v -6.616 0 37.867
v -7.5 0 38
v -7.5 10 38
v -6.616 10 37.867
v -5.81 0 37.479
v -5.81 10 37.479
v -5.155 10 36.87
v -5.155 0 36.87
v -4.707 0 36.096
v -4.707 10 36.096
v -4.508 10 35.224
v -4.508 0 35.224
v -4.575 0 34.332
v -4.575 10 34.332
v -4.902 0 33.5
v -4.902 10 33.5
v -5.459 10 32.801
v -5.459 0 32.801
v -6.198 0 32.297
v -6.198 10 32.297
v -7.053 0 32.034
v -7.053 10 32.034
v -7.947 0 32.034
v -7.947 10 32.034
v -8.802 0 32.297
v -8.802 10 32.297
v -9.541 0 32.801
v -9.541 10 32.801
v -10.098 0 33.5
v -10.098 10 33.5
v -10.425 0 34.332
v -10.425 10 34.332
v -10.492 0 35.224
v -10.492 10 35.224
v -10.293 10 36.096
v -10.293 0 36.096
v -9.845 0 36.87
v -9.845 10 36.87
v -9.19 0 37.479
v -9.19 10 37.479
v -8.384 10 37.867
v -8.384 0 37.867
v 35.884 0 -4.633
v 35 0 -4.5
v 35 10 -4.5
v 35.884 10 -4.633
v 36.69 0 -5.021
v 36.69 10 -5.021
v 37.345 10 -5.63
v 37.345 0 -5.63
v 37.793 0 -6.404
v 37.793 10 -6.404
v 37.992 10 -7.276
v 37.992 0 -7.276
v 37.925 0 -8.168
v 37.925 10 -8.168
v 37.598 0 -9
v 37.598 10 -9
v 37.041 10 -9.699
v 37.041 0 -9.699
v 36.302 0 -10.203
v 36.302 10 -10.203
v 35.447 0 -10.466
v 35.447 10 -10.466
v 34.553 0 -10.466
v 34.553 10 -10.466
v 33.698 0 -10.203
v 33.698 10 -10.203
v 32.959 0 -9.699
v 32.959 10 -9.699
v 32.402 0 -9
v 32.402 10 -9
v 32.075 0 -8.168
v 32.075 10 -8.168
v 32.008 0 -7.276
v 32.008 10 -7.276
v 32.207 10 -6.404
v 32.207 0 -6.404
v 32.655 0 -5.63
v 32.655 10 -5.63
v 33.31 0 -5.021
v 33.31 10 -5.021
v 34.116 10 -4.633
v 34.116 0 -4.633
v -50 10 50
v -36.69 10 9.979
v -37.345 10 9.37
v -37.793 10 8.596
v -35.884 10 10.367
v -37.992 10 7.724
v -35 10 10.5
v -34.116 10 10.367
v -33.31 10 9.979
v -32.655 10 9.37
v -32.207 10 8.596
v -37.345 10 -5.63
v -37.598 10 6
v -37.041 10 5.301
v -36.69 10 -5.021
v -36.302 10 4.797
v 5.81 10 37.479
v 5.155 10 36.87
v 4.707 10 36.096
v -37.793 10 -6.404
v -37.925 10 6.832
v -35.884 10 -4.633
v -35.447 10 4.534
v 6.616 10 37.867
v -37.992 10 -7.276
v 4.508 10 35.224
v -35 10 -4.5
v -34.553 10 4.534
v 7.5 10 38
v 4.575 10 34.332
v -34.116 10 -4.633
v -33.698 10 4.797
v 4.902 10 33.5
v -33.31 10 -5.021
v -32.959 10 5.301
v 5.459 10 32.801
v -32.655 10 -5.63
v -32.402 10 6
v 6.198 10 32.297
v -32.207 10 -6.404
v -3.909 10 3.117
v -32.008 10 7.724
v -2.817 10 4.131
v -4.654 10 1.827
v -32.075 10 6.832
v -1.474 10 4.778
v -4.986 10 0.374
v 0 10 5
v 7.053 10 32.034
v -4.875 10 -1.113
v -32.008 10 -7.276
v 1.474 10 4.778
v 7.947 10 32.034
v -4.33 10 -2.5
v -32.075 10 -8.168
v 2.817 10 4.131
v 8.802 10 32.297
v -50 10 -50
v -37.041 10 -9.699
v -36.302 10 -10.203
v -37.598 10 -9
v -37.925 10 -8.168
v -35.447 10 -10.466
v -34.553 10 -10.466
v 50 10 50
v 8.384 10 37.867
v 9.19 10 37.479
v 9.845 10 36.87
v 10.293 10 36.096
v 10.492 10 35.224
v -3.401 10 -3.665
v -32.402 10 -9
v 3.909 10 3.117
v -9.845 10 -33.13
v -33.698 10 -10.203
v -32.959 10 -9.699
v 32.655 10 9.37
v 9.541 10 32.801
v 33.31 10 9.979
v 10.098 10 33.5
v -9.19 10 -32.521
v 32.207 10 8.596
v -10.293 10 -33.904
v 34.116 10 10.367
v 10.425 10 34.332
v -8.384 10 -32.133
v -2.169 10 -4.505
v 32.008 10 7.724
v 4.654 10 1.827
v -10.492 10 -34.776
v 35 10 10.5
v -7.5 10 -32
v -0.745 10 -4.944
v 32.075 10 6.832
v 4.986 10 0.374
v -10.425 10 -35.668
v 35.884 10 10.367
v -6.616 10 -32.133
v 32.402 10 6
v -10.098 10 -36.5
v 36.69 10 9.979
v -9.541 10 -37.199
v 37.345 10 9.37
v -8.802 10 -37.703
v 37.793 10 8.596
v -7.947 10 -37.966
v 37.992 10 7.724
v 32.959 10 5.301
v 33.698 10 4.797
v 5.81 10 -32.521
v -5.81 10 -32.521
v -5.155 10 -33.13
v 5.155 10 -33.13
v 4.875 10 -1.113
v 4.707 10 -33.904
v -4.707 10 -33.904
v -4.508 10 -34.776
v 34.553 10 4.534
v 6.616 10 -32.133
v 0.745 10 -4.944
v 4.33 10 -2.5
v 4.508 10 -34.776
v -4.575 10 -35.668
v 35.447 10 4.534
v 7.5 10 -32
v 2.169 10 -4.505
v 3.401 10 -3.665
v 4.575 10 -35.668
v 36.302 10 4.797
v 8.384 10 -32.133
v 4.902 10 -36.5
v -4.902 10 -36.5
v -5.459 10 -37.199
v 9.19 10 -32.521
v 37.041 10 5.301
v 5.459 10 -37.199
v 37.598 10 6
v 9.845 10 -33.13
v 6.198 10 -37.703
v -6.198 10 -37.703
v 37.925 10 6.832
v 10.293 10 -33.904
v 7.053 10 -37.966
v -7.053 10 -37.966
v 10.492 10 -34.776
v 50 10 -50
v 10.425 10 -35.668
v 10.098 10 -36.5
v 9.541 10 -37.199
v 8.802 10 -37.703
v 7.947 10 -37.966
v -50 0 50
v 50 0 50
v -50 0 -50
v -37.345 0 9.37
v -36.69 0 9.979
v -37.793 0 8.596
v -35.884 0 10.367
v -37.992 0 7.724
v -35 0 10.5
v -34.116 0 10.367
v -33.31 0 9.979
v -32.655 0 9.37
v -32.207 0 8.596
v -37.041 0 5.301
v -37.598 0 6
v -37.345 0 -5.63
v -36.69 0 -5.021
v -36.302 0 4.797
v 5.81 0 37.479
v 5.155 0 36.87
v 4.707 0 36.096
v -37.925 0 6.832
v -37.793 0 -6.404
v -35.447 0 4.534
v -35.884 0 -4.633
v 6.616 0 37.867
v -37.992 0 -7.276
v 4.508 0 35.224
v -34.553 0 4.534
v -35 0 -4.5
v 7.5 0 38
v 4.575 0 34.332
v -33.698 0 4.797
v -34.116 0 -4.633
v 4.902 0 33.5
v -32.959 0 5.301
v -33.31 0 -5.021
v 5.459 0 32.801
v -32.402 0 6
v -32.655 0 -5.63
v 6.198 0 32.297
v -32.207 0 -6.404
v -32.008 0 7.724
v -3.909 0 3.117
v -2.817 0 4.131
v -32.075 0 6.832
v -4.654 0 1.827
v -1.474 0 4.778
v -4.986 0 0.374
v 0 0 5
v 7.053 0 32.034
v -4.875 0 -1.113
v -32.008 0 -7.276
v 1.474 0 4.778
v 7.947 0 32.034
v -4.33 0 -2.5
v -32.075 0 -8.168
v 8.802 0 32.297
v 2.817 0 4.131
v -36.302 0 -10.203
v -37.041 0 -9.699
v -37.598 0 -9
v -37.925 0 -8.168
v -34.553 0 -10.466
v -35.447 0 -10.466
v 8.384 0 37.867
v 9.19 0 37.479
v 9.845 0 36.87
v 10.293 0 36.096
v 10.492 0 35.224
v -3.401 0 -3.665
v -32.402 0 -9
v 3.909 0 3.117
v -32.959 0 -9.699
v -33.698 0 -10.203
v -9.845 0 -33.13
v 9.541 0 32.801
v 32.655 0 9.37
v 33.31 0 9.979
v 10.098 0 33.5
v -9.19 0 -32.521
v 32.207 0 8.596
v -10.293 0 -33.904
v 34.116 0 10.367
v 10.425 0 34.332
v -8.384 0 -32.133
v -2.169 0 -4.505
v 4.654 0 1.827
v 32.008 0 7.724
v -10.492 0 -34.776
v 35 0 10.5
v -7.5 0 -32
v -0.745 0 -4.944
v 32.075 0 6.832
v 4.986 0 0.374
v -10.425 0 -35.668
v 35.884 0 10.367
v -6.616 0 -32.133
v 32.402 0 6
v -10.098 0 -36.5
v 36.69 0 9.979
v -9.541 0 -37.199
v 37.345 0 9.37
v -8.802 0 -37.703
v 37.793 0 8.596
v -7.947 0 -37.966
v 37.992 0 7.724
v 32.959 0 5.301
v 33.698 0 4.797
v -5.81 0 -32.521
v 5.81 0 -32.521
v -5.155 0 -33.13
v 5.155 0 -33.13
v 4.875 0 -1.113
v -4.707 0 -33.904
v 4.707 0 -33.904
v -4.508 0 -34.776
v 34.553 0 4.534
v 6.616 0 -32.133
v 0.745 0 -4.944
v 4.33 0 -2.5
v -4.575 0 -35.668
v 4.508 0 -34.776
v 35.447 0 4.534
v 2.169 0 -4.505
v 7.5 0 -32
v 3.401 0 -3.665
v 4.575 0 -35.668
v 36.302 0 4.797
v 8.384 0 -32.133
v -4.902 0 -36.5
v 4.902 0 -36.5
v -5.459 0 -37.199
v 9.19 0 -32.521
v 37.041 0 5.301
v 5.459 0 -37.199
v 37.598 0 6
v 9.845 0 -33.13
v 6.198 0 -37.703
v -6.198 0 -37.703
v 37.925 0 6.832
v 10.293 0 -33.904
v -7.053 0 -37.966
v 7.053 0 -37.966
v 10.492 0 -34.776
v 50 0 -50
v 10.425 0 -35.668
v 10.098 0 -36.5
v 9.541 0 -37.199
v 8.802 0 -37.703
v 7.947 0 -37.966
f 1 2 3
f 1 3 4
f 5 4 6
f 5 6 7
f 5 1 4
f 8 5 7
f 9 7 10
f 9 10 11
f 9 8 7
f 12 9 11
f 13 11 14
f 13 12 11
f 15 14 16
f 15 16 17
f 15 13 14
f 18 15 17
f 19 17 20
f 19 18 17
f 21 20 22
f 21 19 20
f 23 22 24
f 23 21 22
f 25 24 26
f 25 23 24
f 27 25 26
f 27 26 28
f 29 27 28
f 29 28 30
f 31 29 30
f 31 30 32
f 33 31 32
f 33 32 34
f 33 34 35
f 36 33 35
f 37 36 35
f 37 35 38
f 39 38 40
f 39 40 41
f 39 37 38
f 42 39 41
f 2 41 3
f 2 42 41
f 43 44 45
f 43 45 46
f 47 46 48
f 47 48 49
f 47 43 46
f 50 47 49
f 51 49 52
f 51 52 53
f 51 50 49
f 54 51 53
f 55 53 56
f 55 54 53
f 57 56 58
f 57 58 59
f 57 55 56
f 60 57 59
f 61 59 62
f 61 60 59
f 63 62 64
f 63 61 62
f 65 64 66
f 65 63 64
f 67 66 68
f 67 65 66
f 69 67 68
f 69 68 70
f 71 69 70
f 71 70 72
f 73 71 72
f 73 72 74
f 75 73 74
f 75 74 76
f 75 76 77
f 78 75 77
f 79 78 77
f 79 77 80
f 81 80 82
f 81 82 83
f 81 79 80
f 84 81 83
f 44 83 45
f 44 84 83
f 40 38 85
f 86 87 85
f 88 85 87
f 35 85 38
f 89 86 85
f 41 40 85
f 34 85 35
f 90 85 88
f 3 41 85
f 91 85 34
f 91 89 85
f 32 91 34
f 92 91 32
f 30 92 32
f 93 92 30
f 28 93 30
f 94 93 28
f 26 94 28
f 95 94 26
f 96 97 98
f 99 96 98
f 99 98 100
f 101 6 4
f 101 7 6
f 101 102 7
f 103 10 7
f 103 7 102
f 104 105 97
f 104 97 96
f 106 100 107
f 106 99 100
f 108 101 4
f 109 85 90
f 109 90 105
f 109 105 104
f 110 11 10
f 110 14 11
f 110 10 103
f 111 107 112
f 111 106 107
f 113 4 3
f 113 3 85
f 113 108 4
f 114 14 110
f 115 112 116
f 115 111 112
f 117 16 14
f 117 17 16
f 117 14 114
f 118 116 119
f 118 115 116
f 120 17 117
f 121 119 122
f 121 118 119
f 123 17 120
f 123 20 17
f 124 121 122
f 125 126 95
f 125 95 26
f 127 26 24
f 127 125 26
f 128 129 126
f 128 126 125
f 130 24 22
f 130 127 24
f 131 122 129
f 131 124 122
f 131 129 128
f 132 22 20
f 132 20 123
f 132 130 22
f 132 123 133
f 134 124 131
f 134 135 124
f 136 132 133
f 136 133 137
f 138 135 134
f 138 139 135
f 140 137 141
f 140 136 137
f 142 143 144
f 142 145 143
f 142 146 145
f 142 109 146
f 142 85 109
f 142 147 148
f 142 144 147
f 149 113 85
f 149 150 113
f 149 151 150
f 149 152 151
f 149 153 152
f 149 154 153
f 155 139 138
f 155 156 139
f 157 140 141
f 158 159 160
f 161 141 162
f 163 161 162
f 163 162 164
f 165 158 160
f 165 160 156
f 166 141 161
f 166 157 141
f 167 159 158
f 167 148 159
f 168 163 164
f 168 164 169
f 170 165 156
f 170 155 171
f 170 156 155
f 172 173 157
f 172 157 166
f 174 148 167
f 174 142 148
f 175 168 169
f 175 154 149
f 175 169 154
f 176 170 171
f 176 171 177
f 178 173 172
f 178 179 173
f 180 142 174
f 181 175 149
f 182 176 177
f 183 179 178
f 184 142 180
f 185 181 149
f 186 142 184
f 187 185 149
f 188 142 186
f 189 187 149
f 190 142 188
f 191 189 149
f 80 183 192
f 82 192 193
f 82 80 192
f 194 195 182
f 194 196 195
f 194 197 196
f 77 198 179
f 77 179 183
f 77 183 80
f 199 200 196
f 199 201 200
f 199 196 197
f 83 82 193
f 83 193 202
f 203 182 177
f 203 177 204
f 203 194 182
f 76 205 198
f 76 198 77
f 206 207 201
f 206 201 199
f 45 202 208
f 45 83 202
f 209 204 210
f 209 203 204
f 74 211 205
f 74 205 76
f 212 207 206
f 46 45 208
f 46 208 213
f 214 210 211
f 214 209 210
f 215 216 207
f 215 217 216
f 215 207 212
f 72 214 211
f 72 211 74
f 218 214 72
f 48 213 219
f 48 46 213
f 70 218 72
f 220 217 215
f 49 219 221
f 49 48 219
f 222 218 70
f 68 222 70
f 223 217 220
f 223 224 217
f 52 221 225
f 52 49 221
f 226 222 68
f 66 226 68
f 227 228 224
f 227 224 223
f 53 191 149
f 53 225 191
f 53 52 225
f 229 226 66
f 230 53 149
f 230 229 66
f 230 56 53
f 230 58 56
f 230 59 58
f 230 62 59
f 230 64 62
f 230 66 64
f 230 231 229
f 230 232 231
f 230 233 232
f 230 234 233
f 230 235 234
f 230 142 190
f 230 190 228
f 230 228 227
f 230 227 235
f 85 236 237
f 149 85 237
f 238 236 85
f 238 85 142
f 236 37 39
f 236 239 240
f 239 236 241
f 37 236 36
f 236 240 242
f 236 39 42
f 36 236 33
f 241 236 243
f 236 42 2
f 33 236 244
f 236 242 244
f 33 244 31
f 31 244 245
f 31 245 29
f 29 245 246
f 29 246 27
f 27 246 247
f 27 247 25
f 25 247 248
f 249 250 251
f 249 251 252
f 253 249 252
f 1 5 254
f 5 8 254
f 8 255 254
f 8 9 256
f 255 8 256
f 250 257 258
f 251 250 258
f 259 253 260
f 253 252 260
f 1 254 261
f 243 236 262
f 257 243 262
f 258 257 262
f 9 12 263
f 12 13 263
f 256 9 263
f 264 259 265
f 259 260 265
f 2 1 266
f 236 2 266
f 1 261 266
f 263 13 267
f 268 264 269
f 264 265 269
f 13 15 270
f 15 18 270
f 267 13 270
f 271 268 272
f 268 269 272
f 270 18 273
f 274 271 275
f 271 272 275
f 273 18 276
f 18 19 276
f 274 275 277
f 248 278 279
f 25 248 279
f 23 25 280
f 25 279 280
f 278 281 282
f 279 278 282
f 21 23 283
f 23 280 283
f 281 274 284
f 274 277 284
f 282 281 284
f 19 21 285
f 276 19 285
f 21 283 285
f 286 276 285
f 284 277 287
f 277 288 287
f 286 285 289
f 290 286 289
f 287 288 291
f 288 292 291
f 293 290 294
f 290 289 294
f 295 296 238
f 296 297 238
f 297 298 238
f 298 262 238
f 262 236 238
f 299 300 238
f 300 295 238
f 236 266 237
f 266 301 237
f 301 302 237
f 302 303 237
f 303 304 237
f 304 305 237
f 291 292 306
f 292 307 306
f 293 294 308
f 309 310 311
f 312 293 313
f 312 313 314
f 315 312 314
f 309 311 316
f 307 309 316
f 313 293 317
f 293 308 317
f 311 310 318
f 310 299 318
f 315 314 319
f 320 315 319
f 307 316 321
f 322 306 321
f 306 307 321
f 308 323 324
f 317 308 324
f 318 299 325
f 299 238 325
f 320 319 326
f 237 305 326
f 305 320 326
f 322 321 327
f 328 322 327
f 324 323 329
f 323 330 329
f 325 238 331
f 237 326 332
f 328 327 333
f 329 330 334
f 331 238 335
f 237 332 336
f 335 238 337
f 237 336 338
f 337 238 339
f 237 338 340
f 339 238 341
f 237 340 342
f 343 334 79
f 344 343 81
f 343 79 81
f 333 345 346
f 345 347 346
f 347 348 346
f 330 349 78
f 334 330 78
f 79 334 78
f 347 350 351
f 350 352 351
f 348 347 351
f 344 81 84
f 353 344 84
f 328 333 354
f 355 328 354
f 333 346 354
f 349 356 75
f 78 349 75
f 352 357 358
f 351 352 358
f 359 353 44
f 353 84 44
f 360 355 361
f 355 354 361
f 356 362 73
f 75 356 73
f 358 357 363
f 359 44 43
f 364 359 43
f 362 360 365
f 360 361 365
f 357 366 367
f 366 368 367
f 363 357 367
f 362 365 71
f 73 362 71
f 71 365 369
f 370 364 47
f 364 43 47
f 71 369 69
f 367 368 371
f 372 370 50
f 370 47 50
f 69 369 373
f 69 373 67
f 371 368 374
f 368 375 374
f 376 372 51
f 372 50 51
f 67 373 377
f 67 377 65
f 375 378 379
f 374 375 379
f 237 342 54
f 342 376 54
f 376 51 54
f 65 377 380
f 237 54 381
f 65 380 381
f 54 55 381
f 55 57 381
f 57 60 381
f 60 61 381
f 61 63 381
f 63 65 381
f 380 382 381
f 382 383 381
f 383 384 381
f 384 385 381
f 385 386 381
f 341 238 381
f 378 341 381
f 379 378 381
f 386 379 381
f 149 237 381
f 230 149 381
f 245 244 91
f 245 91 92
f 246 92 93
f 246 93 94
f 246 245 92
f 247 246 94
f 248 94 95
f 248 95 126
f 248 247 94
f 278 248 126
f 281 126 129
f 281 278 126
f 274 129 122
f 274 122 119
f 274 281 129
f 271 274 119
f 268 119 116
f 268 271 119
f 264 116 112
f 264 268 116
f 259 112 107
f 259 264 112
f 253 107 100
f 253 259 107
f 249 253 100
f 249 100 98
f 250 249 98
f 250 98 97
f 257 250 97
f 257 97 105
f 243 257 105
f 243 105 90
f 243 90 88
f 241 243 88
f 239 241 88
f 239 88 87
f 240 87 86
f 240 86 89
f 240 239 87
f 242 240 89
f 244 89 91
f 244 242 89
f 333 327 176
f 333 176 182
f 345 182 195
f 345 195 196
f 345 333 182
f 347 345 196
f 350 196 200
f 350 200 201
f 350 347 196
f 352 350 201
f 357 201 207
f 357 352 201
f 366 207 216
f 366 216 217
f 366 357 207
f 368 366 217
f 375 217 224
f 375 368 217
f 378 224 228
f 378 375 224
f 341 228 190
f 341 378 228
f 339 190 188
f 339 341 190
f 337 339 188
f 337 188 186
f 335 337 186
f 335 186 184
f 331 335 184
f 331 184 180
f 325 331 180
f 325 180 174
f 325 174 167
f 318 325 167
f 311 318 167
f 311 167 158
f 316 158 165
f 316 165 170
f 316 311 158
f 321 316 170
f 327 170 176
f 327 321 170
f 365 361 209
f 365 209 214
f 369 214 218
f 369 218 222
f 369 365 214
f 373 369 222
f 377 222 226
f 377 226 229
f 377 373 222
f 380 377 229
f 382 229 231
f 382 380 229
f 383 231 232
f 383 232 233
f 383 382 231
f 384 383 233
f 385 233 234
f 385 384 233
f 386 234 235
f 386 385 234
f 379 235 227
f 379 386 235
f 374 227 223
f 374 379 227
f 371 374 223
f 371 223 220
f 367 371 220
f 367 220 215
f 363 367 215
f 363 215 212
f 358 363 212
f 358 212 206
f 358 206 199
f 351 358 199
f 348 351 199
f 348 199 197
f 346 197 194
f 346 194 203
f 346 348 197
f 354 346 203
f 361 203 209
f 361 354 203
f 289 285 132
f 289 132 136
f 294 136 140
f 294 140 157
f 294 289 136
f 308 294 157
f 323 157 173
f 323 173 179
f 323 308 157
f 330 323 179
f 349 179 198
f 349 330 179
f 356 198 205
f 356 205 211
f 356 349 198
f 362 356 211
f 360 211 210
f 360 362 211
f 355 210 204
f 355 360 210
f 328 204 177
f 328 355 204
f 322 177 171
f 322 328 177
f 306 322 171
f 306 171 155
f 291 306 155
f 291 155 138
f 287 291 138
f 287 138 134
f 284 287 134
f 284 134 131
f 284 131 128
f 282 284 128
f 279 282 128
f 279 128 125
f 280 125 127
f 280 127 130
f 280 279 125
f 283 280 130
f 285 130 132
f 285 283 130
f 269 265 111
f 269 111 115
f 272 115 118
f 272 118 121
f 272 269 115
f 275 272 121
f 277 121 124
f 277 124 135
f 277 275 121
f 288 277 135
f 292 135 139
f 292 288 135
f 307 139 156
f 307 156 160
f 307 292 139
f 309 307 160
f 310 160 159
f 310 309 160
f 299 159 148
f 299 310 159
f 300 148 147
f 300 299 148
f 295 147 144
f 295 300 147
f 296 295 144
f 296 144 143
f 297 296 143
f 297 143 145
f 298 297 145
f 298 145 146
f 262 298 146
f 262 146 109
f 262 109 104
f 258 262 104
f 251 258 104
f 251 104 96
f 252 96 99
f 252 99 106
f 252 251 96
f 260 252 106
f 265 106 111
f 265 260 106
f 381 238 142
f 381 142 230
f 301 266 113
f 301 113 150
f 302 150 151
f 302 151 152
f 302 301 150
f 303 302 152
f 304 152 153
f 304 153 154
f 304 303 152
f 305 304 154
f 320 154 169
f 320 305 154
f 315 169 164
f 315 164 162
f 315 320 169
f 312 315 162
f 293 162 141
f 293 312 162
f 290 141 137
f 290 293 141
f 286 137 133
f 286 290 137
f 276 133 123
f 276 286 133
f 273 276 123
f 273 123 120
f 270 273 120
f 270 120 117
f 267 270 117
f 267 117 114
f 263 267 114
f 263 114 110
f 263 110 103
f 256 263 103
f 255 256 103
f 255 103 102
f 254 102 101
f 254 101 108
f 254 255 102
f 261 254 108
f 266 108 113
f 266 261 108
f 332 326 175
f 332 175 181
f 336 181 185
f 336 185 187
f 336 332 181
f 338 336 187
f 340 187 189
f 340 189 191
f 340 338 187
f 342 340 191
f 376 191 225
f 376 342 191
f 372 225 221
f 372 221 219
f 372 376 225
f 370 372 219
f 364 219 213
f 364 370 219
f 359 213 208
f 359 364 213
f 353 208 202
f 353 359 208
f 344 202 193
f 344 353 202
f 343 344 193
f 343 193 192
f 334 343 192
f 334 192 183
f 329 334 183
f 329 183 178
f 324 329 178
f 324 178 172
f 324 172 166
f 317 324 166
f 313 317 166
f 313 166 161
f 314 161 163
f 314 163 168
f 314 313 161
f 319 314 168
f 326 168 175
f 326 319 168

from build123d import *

# Parameters (mm, degrees)
SKETCH1_W           = 100
SKETCH1_H           = 100
SKETCH1_R           = 5
SKETCH1_R_2         = 3
BOSS_EXTRUDE1_DEPTH = 10


with BuildPart() as part:
    # Sketch1 → Boss-Extrude1 (new body)
    with BuildSketch(Plane(origin=(0, 0, 0), x_dir=(1, 0, 0), z_dir=(0, 1, 0))):
        Rectangle(SKETCH1_W, SKETCH1_H)
        with Locations(Location((0, 0, 0), (0, 0, 270))):
            Circle(SKETCH1_R, mode=Mode.SUBTRACT)
        with Locations(Location((-7.5, 35, 0), (0, 0, 270))):
            Circle(SKETCH1_R_2, mode=Mode.SUBTRACT)
        with Locations(Location((7.5, 35, 0), (0, 0, 270))):
            Circle(SKETCH1_R_2, mode=Mode.SUBTRACT)
        with Locations(Location((35, 7.5, 0), (0, 0, 270))):
            Circle(SKETCH1_R_2, mode=Mode.SUBTRACT)
        with Locations(Location((35, -7.5, 0), (0, 0, 270))):
            Circle(SKETCH1_R_2, mode=Mode.SUBTRACT)
        with Locations(Location((7.5, -35, 0), (0, 0, 270))):
            Circle(SKETCH1_R_2, mode=Mode.SUBTRACT)
        with Locations(Location((-7.5, -35, 0), (0, 0, 270))):
            Circle(SKETCH1_R_2, mode=Mode.SUBTRACT)
        with Locations(Location((-35, -7.5, 0), (0, 0, 270))):
            Circle(SKETCH1_R_2, mode=Mode.SUBTRACT)
        with Locations(Location((-35, 7.5, 0), (0, 0, 270))):
            Circle(SKETCH1_R_2, mode=Mode.SUBTRACT)
    extrude(amount=BOSS_EXTRUDE1_DEPTH)


solid = part.part
